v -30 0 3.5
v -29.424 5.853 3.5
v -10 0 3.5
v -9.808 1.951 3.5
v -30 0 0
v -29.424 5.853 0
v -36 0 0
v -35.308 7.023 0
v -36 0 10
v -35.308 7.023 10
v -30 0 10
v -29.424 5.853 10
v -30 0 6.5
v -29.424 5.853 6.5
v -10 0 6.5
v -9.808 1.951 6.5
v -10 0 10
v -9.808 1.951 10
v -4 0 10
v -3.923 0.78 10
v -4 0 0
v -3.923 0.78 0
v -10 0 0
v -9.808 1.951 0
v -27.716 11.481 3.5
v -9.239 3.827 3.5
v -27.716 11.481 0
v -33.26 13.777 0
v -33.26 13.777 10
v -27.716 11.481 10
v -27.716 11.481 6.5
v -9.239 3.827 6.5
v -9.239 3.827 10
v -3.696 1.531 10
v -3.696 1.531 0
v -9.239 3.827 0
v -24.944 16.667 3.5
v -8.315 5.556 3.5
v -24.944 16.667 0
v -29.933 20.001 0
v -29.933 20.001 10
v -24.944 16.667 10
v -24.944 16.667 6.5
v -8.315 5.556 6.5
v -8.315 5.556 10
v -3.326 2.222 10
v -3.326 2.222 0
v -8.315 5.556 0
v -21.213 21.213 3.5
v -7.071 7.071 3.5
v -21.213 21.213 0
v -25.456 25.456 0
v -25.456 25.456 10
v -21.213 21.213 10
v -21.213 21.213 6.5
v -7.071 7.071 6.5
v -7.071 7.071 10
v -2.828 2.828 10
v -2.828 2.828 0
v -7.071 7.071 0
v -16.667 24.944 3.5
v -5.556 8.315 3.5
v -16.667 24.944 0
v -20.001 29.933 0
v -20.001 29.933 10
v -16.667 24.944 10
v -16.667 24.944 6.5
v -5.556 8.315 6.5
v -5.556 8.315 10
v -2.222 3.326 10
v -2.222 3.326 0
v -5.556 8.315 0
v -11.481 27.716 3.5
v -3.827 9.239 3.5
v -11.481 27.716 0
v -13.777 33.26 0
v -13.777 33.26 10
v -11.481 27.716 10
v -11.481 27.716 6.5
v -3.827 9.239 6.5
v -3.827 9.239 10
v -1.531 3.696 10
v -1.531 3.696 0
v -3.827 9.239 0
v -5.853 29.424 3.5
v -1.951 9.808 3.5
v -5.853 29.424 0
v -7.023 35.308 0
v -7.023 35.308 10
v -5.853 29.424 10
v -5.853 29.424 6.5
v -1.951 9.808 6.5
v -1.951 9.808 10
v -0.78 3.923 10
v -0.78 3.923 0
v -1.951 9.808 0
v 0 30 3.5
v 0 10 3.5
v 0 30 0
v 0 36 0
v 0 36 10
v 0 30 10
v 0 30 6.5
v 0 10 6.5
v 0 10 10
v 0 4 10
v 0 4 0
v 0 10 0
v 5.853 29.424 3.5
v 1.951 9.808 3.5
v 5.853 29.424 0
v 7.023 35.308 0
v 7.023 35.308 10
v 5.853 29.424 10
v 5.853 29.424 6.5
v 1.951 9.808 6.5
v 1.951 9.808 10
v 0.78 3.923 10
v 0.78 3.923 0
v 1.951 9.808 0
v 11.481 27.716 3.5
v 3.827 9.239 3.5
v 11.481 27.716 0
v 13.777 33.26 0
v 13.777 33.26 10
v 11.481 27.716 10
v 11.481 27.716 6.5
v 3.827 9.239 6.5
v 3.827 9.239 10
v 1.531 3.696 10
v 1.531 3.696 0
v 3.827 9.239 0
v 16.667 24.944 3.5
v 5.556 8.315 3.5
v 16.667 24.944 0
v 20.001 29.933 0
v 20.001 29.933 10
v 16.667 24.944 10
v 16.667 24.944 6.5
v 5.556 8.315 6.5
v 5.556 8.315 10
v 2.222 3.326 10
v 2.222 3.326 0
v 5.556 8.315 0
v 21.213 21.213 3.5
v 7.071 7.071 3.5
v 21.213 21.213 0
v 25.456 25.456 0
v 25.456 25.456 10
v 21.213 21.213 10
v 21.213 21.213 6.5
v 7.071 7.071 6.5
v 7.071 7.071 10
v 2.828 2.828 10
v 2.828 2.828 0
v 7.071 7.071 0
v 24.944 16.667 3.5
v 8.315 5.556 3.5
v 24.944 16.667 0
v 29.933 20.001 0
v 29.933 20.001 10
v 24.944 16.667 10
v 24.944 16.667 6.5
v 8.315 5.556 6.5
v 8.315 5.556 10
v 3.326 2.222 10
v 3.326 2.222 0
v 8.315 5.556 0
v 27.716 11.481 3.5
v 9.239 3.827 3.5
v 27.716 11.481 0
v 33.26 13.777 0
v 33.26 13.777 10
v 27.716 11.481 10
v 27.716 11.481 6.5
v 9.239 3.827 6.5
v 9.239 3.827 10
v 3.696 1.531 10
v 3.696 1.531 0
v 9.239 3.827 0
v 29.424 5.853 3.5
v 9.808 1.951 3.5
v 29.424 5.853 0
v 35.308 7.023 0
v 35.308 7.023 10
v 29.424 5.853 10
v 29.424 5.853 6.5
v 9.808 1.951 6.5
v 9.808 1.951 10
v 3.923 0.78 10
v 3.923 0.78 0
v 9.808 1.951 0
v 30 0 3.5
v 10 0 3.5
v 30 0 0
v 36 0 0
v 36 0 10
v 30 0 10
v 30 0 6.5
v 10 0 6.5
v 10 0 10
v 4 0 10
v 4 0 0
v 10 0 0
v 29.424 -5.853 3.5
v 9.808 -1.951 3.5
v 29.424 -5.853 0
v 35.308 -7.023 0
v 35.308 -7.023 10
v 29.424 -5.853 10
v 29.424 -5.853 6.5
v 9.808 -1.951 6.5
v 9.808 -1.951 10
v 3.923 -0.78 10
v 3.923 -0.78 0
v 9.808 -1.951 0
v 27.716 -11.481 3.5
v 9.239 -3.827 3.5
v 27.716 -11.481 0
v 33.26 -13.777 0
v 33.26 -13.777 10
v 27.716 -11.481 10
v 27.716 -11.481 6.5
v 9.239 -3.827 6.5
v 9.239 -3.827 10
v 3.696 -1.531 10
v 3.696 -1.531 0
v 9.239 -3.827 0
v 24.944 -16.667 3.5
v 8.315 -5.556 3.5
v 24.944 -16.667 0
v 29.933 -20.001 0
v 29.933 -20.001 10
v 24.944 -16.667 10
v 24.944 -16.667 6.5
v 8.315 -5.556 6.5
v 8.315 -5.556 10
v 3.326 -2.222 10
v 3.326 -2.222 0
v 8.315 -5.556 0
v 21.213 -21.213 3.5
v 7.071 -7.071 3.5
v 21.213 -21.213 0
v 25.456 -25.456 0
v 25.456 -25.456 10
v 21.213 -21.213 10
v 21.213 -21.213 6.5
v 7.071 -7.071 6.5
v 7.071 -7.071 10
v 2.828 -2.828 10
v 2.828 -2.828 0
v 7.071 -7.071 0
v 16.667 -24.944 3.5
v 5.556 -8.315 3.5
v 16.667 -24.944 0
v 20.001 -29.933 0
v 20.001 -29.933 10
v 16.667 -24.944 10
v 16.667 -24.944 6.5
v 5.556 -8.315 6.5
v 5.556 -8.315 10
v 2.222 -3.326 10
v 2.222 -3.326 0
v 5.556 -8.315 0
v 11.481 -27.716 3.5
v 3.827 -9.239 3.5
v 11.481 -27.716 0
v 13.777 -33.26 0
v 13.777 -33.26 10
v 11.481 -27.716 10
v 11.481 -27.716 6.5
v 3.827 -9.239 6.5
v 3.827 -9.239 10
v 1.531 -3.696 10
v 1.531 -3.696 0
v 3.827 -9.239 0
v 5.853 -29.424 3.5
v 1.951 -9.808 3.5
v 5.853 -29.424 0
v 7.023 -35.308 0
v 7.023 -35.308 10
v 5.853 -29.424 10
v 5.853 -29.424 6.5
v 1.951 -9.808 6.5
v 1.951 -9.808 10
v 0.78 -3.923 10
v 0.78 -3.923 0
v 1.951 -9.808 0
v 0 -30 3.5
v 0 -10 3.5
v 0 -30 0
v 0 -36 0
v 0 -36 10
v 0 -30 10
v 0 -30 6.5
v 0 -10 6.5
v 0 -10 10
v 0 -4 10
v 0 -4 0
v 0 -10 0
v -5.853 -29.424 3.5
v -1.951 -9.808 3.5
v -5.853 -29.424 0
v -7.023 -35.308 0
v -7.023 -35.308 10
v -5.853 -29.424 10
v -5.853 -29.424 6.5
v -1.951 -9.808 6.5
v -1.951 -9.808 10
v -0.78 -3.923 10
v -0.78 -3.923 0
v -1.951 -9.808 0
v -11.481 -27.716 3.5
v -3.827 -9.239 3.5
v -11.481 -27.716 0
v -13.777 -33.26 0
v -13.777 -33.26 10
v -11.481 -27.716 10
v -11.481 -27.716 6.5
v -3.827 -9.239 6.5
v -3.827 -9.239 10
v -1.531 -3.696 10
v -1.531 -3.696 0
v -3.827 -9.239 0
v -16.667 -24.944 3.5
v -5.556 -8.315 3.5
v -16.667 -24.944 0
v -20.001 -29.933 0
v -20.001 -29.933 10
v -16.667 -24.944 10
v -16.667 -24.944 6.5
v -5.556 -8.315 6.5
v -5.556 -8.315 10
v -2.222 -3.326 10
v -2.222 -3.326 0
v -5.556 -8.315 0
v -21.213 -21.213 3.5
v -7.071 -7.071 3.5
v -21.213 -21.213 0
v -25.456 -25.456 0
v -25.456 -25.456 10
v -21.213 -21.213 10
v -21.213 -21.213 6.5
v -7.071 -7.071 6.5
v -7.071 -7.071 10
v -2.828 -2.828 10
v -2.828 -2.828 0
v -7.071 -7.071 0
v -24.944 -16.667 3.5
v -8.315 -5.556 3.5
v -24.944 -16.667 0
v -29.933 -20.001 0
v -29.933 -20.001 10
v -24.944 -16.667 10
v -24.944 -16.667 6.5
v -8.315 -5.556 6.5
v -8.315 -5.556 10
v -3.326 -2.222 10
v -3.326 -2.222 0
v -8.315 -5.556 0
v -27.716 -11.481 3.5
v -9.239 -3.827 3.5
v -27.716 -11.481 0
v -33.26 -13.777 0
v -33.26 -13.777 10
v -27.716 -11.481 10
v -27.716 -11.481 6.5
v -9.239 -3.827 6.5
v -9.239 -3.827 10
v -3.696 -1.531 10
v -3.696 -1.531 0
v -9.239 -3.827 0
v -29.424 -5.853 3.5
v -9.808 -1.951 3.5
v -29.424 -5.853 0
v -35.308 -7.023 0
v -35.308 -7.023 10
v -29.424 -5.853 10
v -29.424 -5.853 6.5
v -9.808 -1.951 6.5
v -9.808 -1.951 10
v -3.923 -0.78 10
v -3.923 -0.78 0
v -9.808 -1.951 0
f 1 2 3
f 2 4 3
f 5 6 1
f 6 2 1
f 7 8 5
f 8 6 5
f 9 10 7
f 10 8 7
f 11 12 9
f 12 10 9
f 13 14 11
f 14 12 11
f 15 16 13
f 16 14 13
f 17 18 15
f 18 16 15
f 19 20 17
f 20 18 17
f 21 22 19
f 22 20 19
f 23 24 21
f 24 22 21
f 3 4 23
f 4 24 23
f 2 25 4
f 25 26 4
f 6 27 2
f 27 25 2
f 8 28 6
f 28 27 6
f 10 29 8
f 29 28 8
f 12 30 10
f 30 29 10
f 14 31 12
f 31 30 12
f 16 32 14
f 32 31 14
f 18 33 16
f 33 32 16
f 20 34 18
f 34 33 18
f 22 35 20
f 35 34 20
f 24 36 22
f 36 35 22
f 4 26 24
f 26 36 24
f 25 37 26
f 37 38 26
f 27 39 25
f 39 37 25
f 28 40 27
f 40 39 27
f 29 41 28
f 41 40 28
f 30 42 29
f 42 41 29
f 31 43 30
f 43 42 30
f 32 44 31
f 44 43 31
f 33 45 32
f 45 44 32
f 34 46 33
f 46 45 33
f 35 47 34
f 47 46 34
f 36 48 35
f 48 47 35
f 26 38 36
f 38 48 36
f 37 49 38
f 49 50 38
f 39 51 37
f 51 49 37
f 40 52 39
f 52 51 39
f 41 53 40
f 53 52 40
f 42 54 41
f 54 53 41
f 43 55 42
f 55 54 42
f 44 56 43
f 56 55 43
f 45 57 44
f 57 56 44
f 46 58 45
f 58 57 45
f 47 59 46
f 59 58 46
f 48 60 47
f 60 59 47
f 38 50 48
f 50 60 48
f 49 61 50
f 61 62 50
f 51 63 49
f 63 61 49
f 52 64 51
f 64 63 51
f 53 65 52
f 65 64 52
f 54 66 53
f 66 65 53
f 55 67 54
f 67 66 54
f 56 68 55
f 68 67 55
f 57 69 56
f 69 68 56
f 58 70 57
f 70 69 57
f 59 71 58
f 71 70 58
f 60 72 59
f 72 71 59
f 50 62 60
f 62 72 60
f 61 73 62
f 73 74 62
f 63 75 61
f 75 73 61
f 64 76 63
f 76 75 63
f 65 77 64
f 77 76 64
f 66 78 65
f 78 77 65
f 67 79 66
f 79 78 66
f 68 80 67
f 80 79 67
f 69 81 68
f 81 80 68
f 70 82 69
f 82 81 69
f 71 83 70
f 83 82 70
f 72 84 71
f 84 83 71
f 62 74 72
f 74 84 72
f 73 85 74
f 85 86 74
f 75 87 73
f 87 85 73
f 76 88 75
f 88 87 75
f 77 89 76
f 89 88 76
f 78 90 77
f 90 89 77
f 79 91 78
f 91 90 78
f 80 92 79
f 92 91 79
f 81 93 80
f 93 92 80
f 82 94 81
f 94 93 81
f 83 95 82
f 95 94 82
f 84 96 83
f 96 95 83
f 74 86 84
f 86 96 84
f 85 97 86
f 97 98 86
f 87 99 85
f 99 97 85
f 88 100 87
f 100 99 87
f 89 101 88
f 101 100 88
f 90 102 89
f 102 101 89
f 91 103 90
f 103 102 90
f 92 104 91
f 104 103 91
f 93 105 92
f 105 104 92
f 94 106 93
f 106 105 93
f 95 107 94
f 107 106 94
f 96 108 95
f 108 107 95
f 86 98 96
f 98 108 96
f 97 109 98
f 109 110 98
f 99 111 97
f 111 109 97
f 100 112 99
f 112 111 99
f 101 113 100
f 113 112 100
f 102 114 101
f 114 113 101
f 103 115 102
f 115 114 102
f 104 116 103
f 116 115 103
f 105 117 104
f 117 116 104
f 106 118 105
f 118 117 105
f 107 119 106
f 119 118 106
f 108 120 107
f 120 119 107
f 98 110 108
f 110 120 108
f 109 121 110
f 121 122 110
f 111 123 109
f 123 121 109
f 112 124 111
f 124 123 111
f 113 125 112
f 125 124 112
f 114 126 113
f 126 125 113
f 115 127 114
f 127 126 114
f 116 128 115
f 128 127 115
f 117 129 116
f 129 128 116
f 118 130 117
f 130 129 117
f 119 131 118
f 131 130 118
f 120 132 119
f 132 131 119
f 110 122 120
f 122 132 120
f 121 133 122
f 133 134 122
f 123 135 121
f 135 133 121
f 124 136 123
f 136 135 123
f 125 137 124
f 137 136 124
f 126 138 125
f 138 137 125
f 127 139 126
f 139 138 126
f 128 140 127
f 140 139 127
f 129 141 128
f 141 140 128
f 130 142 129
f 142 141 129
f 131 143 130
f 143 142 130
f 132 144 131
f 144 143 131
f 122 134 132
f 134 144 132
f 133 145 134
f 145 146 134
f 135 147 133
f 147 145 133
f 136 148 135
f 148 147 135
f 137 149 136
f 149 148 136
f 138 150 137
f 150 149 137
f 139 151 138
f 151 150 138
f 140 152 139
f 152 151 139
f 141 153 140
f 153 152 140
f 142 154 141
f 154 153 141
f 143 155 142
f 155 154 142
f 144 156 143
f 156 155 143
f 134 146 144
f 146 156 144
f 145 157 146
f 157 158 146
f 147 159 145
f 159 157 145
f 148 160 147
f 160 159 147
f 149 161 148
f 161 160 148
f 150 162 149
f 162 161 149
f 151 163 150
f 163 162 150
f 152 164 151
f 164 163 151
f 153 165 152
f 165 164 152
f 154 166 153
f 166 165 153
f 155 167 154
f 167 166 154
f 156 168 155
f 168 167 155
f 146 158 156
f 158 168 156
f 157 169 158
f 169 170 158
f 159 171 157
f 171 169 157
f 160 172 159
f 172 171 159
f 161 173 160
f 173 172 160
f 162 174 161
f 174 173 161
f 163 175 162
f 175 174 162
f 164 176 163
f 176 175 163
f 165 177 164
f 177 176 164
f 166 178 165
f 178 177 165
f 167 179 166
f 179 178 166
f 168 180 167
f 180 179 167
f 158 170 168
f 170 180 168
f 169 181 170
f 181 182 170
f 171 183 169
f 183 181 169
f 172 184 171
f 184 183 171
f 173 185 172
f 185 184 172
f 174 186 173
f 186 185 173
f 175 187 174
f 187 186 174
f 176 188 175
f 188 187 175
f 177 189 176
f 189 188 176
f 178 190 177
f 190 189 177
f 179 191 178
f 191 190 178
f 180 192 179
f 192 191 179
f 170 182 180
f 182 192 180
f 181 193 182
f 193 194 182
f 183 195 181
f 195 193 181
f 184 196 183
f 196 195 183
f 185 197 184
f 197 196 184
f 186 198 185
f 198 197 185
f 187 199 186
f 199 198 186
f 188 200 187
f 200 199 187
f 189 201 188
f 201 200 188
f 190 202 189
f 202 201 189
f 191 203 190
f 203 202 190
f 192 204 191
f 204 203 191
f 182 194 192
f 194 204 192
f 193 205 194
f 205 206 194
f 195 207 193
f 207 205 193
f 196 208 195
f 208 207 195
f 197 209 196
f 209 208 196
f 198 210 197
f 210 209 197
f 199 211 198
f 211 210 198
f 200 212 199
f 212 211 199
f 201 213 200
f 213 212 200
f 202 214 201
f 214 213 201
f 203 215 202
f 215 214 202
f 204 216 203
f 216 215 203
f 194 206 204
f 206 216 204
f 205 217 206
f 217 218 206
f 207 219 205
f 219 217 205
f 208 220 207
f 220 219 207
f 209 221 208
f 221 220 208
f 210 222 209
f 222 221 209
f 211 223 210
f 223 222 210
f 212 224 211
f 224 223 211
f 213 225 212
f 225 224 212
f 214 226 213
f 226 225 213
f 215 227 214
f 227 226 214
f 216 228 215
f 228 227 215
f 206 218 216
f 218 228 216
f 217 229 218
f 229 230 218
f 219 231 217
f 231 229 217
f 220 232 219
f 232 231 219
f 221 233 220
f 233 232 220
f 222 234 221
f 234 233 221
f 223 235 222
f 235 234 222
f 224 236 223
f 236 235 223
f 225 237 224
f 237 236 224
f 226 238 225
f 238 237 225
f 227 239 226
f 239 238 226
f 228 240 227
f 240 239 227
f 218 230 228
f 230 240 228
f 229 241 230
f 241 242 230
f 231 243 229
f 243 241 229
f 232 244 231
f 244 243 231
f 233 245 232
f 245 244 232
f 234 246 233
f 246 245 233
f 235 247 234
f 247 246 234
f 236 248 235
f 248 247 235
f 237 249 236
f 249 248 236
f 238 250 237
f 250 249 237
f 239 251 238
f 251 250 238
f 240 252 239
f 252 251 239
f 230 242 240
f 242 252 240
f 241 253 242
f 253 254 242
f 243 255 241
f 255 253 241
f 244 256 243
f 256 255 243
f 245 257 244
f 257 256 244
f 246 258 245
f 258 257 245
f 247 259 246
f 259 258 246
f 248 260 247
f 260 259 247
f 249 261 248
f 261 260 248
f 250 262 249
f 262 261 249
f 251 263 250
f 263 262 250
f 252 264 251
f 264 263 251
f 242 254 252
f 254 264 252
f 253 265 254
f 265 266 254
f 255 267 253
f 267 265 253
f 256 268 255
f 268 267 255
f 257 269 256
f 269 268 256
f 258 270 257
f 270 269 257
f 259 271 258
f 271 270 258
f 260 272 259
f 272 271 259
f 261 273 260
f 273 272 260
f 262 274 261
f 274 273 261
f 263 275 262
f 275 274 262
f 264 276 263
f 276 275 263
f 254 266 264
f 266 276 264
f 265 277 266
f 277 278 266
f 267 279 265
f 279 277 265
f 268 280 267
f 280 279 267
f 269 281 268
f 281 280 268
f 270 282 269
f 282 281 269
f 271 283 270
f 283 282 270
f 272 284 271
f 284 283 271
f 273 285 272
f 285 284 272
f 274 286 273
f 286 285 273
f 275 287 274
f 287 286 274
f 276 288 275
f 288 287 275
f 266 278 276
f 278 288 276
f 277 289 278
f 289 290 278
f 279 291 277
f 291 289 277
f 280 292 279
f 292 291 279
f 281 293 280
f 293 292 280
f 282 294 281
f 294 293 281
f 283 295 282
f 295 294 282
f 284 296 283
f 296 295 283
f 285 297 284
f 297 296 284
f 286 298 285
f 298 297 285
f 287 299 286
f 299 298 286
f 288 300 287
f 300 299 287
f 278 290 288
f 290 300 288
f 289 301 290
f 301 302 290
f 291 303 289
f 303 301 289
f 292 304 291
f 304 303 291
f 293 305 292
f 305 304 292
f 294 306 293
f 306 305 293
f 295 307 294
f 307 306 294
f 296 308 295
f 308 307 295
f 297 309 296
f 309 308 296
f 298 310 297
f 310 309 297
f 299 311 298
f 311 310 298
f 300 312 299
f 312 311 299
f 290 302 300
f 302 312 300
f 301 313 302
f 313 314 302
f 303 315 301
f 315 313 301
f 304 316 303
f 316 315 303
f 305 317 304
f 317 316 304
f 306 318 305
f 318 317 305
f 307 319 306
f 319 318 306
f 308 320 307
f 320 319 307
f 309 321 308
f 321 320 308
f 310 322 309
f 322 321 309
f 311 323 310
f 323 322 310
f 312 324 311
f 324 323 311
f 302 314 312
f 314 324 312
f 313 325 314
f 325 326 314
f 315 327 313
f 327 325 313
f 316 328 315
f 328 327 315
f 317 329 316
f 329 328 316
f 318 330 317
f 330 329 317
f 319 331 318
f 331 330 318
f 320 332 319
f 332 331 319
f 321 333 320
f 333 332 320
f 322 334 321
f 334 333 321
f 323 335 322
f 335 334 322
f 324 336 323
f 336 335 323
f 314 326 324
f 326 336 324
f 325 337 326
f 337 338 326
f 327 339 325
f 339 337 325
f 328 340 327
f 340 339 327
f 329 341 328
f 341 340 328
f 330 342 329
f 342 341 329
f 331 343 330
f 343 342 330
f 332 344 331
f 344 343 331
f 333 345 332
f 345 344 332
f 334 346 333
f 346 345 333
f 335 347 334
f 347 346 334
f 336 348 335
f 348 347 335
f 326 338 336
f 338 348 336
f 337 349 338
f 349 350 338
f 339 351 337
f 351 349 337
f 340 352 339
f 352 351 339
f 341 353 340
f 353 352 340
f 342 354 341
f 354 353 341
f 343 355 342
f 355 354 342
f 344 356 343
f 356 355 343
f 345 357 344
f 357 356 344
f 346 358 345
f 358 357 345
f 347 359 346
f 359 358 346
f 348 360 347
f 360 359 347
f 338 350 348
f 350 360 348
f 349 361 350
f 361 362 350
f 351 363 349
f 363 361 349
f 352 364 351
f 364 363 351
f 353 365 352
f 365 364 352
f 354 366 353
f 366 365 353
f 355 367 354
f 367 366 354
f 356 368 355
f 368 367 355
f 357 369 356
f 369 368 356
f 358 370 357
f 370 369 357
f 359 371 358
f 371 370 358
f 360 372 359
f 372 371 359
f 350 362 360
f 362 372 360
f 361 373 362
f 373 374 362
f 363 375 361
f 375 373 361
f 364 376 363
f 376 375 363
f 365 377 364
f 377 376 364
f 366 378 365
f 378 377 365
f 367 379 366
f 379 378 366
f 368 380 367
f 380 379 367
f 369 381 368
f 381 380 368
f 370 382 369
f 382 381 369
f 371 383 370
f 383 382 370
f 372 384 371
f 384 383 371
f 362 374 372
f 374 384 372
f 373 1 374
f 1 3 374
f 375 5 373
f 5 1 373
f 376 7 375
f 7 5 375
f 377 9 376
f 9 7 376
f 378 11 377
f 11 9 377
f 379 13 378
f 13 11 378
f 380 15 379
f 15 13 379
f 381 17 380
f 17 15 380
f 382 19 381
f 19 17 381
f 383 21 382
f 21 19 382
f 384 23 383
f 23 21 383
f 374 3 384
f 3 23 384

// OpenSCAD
$fn = 32;

// ----------------------------------------------------------------------
// Revolved part: handwheel R36
// ----------------------------------------------------------------------

// --- parameters (mm) ---
bore_r = 4;               // bore radius
rim_r = 36;               // rim radius
rim_w = 6;                // rim axial width
rim_t = 10;               // rim diameter height
hub_r = 10;               // hub radius
web_t = 3;                // web thickness
revolve_angle = 360;      // revolve sweep, degrees
fit_tol = 0.05;           // declared fit tolerance (prompt contract)
free_tol = 0.2;           // declared free tolerance (prompt contract)

bore_d = 2 * bore_r;
rim_d = 2 * rim_r;
hub_d = 2 * hub_r;

profile = [[4, 0], [10, 0], [10, 3.5], [30, 3.5], [30, 0], [36, 0], [36, 10], [30, 10], [30, 6.5], [10, 6.5], [10, 10], [4, 10]];  // primary outline, 12 points, counter clockwise

// --- the one profile operation ---
rotate_extrude(angle = revolve_angle) polygon(points = profile);
